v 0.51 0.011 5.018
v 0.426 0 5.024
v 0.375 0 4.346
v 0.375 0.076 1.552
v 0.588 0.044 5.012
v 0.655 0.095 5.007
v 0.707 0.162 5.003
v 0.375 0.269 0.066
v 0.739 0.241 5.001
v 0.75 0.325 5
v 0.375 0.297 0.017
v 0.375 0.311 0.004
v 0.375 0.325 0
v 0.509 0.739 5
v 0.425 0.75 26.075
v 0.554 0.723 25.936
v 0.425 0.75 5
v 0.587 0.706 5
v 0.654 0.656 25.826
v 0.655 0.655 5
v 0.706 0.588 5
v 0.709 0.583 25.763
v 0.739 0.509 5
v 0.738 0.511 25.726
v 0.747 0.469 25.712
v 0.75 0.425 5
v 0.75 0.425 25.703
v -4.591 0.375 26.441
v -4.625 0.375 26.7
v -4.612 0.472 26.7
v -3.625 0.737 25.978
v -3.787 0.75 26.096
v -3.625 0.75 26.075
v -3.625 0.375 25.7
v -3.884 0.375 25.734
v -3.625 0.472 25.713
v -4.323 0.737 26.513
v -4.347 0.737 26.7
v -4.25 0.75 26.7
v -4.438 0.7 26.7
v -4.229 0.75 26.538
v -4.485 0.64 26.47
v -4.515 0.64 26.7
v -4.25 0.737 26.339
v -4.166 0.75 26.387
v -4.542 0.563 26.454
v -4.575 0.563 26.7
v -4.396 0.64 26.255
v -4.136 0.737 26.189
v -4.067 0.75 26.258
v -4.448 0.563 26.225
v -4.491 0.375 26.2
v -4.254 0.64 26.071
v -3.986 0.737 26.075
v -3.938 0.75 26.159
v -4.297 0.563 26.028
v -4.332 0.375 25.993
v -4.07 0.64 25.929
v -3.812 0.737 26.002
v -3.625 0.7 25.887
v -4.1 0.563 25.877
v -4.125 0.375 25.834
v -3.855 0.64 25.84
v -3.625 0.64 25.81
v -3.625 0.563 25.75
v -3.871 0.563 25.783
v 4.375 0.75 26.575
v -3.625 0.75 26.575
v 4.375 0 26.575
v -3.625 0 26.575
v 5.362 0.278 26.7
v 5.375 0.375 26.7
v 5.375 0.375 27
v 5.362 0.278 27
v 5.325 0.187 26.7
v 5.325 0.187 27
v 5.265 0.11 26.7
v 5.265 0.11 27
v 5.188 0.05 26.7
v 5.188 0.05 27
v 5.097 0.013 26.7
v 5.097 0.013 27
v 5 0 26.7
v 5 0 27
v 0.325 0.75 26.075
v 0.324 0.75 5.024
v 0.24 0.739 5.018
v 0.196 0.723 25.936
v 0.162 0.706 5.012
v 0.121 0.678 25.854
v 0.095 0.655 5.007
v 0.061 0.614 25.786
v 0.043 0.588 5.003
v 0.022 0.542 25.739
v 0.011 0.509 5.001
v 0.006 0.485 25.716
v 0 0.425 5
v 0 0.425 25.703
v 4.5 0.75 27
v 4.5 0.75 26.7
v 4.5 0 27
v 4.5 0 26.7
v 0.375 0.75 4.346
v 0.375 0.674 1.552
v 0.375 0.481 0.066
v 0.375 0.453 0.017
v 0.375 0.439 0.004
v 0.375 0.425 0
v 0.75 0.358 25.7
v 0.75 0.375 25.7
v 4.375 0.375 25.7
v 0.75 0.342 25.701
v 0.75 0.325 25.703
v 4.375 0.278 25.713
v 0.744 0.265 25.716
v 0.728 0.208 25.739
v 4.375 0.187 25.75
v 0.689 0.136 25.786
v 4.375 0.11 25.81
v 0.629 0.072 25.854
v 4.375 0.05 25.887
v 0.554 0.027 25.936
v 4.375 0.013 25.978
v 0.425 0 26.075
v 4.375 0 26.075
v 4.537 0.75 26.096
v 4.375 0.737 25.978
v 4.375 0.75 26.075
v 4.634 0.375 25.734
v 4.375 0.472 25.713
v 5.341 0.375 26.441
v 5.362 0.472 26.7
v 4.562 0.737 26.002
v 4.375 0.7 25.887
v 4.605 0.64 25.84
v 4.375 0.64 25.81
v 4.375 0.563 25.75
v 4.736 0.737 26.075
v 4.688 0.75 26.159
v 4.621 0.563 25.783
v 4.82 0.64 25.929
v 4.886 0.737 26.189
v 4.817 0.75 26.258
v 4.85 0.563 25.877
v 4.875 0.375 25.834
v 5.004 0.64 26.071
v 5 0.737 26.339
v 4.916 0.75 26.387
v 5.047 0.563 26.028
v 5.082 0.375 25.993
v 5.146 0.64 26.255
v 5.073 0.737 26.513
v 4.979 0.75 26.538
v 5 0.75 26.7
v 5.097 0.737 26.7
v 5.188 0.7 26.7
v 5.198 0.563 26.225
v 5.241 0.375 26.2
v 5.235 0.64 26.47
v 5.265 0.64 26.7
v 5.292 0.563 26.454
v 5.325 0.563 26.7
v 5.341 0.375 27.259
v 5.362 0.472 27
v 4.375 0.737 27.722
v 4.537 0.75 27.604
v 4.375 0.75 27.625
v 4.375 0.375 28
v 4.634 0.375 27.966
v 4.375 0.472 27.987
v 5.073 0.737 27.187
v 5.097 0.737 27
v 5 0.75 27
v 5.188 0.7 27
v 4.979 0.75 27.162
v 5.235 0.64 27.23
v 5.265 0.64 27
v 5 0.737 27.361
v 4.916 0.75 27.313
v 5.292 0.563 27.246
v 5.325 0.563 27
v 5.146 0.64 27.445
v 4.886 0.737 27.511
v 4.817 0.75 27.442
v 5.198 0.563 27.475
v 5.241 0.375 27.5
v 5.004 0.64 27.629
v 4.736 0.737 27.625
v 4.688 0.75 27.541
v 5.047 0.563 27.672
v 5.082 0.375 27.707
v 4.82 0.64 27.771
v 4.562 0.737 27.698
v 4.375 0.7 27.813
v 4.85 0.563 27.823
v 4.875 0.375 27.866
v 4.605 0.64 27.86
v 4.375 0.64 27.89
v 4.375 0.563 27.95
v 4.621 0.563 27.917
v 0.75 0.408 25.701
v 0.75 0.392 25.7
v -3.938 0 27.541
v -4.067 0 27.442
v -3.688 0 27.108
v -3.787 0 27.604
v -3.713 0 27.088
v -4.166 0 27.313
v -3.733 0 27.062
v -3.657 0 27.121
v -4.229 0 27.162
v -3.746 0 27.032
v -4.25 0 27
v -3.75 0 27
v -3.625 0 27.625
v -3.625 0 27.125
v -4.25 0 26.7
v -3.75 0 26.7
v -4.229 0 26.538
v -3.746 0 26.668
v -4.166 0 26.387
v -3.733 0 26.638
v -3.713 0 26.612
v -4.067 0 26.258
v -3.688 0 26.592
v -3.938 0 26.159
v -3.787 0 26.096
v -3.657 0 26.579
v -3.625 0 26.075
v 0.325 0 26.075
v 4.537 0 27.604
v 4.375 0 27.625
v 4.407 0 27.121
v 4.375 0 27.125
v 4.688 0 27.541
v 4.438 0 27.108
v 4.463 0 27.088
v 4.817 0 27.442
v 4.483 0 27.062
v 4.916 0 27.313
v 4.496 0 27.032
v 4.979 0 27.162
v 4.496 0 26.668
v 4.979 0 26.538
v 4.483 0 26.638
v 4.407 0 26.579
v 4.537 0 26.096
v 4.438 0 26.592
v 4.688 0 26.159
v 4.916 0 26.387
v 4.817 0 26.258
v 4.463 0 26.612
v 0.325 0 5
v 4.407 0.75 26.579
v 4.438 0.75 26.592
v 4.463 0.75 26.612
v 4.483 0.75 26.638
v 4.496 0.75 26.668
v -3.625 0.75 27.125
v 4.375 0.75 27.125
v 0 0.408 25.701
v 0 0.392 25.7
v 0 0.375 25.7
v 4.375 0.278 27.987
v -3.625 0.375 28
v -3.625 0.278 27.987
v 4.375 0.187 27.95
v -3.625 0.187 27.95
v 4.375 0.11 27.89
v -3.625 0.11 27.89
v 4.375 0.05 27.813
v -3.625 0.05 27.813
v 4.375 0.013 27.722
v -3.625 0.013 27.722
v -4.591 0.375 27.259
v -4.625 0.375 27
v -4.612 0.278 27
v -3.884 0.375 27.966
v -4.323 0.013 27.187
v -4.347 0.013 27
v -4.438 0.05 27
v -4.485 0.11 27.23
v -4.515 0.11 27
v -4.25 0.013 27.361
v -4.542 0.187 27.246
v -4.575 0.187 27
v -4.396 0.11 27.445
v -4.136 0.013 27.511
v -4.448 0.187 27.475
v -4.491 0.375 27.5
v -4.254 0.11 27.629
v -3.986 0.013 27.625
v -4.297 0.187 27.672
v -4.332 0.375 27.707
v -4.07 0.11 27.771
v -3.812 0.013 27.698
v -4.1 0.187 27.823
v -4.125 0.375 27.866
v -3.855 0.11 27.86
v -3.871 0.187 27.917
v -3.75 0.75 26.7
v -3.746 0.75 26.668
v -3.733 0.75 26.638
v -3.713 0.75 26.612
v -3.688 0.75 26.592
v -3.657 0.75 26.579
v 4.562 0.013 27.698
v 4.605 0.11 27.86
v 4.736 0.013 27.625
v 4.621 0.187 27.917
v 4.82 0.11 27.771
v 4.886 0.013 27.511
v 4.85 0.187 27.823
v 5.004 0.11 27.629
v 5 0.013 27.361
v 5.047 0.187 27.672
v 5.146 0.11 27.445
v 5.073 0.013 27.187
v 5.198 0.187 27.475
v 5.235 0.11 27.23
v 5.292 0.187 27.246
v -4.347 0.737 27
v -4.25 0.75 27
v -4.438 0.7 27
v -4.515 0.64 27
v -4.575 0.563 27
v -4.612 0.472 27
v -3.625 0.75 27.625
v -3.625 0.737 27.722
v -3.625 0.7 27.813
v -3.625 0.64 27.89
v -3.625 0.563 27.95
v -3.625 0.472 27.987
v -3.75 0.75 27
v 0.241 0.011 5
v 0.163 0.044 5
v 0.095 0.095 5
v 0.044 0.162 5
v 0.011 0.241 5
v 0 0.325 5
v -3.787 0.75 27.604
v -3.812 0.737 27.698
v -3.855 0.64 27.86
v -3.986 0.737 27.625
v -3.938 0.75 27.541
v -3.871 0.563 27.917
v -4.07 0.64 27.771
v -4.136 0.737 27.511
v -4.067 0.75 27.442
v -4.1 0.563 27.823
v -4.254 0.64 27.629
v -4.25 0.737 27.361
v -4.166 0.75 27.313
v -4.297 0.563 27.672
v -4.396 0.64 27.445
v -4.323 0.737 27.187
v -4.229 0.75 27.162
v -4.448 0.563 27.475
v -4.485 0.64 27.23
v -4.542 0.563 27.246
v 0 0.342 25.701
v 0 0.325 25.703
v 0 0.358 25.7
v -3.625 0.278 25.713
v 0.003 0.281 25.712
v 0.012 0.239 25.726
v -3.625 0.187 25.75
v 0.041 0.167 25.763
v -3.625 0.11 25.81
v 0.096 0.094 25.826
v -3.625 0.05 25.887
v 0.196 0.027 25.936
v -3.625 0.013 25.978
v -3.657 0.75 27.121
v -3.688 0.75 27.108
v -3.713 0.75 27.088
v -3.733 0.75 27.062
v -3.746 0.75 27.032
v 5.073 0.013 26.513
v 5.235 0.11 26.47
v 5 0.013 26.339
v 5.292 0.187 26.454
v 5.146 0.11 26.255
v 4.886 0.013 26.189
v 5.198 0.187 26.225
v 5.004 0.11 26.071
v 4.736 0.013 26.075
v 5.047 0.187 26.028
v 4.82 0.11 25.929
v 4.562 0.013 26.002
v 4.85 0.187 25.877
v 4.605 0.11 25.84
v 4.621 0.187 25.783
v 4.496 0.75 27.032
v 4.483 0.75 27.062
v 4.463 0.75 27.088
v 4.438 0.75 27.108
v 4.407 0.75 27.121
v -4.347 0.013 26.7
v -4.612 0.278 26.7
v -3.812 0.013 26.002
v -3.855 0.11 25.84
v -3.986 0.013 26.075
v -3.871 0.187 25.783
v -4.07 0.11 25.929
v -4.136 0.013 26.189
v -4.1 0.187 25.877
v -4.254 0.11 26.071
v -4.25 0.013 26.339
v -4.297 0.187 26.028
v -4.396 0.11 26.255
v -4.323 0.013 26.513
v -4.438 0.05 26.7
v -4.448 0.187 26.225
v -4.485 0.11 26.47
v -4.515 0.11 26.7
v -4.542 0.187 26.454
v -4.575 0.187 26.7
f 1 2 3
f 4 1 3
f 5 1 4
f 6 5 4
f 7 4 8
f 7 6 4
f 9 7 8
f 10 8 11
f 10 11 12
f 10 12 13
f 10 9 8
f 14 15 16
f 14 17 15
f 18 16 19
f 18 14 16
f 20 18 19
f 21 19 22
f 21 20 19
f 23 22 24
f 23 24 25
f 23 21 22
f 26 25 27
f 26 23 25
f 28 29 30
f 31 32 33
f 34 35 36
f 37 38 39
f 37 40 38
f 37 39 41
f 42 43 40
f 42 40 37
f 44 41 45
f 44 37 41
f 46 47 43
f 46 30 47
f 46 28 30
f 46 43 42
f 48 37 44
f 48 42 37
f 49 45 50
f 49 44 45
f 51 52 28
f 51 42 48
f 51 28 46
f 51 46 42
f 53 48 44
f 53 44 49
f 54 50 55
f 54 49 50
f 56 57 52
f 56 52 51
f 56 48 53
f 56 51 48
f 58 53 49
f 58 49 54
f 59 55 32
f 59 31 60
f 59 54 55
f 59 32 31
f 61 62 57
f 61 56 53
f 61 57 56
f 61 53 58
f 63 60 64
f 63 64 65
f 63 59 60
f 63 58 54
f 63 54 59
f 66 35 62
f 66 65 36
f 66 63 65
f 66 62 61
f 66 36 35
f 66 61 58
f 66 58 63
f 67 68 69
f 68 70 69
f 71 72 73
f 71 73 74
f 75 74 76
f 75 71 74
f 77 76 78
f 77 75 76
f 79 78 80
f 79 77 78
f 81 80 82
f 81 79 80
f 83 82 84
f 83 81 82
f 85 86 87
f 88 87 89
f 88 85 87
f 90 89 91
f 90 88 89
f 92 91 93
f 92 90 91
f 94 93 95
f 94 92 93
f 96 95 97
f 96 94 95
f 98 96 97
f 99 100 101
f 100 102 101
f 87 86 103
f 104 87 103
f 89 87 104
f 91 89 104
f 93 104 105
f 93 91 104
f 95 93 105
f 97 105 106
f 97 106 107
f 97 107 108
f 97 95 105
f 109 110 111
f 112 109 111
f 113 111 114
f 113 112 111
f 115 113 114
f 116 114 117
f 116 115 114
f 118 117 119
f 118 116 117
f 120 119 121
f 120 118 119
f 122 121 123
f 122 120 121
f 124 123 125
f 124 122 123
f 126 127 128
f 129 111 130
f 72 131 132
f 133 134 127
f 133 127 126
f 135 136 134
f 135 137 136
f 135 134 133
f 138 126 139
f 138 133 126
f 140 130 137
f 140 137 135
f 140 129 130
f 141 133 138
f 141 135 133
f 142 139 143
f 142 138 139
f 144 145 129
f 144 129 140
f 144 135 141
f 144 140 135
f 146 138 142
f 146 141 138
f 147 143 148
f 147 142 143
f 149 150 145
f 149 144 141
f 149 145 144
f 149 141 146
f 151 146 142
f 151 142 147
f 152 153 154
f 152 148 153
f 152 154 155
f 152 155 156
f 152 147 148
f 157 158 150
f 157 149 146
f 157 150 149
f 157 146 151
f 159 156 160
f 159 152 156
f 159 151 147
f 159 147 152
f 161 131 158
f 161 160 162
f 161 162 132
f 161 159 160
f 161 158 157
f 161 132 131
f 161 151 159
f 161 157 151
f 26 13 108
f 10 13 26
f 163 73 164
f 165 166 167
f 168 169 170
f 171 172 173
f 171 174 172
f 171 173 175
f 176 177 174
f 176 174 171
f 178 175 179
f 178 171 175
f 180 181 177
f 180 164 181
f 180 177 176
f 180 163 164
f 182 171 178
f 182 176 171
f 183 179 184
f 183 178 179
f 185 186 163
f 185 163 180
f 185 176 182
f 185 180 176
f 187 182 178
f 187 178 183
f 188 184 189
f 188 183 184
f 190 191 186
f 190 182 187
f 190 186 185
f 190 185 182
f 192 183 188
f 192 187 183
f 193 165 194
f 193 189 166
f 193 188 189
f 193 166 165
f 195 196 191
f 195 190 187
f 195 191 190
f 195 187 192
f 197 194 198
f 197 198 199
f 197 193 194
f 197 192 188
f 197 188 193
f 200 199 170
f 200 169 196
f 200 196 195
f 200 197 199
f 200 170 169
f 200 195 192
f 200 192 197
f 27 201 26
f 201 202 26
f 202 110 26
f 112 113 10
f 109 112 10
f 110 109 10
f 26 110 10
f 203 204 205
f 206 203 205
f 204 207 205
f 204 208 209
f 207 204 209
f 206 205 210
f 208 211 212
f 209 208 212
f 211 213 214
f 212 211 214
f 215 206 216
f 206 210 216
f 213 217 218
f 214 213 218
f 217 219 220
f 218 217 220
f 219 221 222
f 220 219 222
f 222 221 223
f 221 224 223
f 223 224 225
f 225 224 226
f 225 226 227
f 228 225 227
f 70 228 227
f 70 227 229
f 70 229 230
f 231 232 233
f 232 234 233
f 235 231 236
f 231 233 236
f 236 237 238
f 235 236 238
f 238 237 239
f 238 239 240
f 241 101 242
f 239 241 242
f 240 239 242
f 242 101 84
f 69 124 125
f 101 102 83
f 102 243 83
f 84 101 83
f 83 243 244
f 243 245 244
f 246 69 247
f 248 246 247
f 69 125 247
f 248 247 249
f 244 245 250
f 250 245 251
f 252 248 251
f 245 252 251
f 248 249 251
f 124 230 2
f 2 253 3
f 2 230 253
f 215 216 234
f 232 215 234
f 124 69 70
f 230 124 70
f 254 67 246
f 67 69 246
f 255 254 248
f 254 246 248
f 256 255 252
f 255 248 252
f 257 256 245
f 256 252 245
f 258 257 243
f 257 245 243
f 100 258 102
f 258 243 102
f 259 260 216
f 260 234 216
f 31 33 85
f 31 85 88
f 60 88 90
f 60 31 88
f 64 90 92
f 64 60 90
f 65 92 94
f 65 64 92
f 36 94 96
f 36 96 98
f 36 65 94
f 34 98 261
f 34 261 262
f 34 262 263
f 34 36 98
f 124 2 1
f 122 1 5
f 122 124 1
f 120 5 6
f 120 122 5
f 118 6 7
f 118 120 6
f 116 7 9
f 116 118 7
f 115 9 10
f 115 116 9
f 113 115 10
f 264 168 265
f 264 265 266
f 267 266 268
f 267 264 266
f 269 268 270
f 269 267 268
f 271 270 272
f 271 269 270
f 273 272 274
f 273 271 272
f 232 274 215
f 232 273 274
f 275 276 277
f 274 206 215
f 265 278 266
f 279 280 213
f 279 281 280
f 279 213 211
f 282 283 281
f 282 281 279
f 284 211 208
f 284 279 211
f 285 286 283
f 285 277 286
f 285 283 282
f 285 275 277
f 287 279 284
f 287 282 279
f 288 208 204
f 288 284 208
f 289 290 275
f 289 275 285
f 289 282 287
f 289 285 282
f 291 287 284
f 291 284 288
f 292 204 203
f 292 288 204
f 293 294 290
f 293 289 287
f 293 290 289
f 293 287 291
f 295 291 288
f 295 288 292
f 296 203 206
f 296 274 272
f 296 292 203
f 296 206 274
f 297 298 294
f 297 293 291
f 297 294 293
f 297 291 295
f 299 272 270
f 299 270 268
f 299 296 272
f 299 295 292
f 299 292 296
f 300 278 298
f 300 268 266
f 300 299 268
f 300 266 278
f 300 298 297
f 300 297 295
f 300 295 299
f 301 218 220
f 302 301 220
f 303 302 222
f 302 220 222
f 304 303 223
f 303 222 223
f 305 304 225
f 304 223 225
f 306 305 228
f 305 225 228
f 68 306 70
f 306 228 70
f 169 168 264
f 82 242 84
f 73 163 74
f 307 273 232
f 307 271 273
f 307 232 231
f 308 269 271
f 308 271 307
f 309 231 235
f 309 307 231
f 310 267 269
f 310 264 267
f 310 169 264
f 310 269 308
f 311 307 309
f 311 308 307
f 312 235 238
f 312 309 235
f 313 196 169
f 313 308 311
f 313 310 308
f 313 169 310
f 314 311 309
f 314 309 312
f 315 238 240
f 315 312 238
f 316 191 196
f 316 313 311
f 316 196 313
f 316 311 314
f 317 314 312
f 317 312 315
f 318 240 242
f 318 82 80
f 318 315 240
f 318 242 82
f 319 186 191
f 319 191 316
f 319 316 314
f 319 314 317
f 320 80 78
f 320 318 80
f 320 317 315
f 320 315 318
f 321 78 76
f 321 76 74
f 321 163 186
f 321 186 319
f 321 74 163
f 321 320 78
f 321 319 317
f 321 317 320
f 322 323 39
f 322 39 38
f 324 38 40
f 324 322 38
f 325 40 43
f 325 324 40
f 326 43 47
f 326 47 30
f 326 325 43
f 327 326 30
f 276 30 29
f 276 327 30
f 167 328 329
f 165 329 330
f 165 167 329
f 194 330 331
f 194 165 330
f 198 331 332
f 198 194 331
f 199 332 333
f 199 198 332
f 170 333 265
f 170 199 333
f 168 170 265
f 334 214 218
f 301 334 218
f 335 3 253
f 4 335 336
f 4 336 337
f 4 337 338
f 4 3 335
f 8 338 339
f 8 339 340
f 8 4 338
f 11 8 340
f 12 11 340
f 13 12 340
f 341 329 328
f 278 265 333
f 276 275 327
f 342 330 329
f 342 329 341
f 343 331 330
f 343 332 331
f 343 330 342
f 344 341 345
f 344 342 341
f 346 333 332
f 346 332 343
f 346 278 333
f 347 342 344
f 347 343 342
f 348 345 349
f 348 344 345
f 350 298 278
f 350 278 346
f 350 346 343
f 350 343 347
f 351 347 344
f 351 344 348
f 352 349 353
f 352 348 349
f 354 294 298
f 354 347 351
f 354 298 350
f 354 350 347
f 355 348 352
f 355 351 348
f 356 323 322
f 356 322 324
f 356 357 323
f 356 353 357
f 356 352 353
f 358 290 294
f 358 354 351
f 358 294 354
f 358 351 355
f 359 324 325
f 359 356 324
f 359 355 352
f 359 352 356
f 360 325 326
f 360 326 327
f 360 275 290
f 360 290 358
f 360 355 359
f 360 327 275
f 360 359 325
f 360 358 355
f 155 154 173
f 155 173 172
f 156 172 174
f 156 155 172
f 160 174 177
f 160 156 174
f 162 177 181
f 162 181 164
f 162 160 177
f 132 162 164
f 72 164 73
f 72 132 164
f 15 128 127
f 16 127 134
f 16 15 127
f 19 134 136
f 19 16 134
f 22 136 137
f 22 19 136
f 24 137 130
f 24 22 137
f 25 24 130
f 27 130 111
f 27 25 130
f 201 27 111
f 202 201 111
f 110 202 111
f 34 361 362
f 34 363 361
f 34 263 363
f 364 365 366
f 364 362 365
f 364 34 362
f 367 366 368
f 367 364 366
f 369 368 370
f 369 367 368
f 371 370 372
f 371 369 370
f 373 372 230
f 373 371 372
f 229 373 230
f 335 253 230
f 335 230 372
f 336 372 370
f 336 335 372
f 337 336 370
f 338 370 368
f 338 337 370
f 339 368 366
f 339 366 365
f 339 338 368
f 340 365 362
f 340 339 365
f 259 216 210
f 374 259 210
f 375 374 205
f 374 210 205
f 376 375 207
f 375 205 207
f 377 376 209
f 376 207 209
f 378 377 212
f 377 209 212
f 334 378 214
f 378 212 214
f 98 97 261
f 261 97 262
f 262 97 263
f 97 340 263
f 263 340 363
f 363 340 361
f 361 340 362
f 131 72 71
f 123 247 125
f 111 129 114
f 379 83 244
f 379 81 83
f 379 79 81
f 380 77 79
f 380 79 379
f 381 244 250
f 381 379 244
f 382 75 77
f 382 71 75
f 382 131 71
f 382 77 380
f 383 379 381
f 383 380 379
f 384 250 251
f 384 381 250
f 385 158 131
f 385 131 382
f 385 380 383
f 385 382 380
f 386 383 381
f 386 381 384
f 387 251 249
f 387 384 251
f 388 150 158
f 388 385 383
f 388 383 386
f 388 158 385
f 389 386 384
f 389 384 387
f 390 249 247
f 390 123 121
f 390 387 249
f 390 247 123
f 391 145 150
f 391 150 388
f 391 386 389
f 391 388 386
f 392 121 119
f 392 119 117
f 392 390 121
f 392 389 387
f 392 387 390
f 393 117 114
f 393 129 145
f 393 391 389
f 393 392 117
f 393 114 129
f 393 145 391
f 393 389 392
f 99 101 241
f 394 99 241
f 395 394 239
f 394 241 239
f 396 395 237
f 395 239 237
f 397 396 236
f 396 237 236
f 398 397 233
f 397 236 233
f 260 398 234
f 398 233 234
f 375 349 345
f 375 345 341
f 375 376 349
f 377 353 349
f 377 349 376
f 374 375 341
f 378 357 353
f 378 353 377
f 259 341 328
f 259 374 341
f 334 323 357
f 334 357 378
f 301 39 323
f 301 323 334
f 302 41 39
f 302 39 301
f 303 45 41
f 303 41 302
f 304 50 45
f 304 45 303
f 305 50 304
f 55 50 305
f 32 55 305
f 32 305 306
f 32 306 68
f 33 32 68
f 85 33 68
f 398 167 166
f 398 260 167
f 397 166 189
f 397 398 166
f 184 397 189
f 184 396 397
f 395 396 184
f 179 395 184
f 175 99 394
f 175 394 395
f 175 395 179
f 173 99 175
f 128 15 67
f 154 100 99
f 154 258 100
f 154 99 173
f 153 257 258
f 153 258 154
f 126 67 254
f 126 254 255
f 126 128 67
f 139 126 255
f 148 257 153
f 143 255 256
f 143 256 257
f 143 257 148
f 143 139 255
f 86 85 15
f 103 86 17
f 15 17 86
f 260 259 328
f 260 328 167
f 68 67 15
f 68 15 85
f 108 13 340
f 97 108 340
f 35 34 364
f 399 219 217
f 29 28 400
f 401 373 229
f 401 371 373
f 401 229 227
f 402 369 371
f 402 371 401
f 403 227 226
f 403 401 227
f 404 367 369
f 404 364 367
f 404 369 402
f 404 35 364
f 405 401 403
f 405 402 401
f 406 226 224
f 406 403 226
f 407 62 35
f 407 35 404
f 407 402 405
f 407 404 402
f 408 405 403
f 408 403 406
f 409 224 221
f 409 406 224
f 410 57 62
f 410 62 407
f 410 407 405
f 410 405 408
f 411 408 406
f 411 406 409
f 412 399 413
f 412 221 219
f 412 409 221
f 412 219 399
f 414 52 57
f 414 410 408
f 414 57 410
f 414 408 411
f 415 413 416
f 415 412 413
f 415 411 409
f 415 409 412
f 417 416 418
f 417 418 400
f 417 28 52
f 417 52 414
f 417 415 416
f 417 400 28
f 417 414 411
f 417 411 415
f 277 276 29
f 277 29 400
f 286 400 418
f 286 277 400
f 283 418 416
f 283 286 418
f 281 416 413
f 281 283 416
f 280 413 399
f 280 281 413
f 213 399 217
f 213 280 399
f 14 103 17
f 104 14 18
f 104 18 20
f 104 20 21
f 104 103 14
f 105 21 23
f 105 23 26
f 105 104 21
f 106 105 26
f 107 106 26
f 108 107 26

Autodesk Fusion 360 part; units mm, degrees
sketch "草图1" plane through (0, 0, 0) normal (0, 1, 0) x (1, 0, 0)
  line L0 (0, 0) -> (0, -25.7)
  line L1 (0, -25.7) -> (-4.625, -25.7)
  line L2 (-4.625, -25.7) -> (-4.625, -28)
  line L3 (-4.625, -28) -> (5.375, -28)
  line L4 (5.375, -28) -> (5.375, -25.7)
  line L5 (5.375, -25.7) -> (0.75, -25.7)
  line L6 (0.75, -25.7) -> (0.75, 0)
  line L7 (0.75, 0) -> (0, 0)
  line L8 (0.375, -28) -> (0.375, 0)
  line L9 (0.375, 0) -> (0.375, -0.4348)
  line L10 (0.375, 0) -> (0.75, -5)
  line L11 (0.375, 0) -> (0, -5)
  line L12 (0.75, -5) -> (0, -5)
  dimension "d1" = 2.3
  dimension "d2" = 0.75
  dimension "d3" = 5
  dimension "d4" = 28
  dimension "d5" = 10
extrude "拉伸1" add sketch "草图1" along normal blind 0.75 contours L0 L1 L2 L3 L8 L12 | L8 L9 L11 L12 | L8 L9 L10 L12 | L3 L4 L5 L6 L8 L12
fillet "圆角1" radius 1 4 edges at (5.375, 0.375, 28) (5.375, 0.375, 25.7) (-4.625, 0.375, 25.7) (-4.625, 0.375, 28)
fillet "圆角2" radius 0.375 18 edges at (-1.8125, 0, 25.7) (-4.3321, 0, 25.9929) (-4.625, 0, 26.85) (-4.3321, 0, 27.7071) (0.375, 0, 28) (5.0821, 0, 27.7071) (5.375, 0, 26.85) (5.0821, 0, 25.9929) (2.5625, 0, 25.7) (-1.8125, 0.75, 25.7) (-4.3321, 0.75, 25.9929) (-4.625, 0.75, 26.85) (-4.3321, 0.75, 27.7071) (0.375, 0.75, 28) (5.0821, 0.75, 27.7071) (5.375, 0.75, 26.85) (5.0821, 0.75, 25.9929) (2.5625, 0.75, 25.7)
fillet "圆角3" radius 0.325 8 edges at (0.75, 0, 15.5375) (0.75, 0.75, 15.5375) (0, 0.75, 15.5375) (0, 0, 15.5375) (0.5625, 0, 2.5) (0.5625, 0.75, 2.5) (0.1875, 0, 2.5) (0.1875, 0.75, 2.5)
sketch "草图2" plane through (0, 0, 0) normal (0, -1, 0) x (1, 0, 0)
  line L0 (0.425, 26.075) -> (4.375, 26.075)
  arc A0 (4.375, 26.075) -> (5, 26.7) centre (4.375, 26.7) ccw
  line L1 (5, 26.7) -> (5, 27)
  arc A1 (5, 27) -> (4.375, 27.625) centre (4.375, 27) ccw
  line L2 (4.375, 27.625) -> (-3.625, 27.625)
  arc A2 (-3.625, 27.625) -> (-4.25, 27) centre (-3.625, 27) ccw
  line L3 (-4.25, 27) -> (-4.25, 26.7)
  arc A3 (-4.25, 26.7) -> (-3.625, 26.075) centre (-3.625, 26.7) ccw
  line L4 (-3.625, 26.075) -> (0.325, 26.075)
  line L5 (0.325, 26.075) -> (0.325, 5.0122)
  line L6 (0.325, 5.0122) -> (0.375, 4.3455)
  line L7 (0.375, 4.3455) -> (0.425, 5.0122)
  line L8 (0.425, 5.0122) -> (0.425, 26.075)
  line L9 (-3.75, 27) -> (-3.75, 26.7)
  arc A4 (-3.75, 26.7) -> (-3.625, 26.575) centre (-3.625, 26.7) ccw
  line L10 (-3.625, 26.575) -> (-0.075, 26.575)
  line L11 (-0.075, 26.575) -> (0.825, 26.575)
  line L12 (0.825, 26.575) -> (4.375, 26.575)
  arc A5 (4.375, 26.575) -> (4.5, 26.7) centre (4.375, 26.7) ccw
  line L13 (4.5, 26.7) -> (4.5, 27)
  arc A6 (4.5, 27) -> (4.375, 27.125) centre (4.375, 27) ccw
  line L14 (4.375, 27.125) -> (-3.625, 27.125)
  arc A7 (-3.625, 27.125) -> (-3.75, 27) centre (-3.625, 27) ccw
  dimension "d14" = -0.5
extrude "拉伸2" cut sketch "草图2" against normal blind 3 contours L9 A4 L10 L11 L12 A5 L13 A6 L14 A7
equation "d11 = ( 0.75 / 2 ) * 1 mm"
